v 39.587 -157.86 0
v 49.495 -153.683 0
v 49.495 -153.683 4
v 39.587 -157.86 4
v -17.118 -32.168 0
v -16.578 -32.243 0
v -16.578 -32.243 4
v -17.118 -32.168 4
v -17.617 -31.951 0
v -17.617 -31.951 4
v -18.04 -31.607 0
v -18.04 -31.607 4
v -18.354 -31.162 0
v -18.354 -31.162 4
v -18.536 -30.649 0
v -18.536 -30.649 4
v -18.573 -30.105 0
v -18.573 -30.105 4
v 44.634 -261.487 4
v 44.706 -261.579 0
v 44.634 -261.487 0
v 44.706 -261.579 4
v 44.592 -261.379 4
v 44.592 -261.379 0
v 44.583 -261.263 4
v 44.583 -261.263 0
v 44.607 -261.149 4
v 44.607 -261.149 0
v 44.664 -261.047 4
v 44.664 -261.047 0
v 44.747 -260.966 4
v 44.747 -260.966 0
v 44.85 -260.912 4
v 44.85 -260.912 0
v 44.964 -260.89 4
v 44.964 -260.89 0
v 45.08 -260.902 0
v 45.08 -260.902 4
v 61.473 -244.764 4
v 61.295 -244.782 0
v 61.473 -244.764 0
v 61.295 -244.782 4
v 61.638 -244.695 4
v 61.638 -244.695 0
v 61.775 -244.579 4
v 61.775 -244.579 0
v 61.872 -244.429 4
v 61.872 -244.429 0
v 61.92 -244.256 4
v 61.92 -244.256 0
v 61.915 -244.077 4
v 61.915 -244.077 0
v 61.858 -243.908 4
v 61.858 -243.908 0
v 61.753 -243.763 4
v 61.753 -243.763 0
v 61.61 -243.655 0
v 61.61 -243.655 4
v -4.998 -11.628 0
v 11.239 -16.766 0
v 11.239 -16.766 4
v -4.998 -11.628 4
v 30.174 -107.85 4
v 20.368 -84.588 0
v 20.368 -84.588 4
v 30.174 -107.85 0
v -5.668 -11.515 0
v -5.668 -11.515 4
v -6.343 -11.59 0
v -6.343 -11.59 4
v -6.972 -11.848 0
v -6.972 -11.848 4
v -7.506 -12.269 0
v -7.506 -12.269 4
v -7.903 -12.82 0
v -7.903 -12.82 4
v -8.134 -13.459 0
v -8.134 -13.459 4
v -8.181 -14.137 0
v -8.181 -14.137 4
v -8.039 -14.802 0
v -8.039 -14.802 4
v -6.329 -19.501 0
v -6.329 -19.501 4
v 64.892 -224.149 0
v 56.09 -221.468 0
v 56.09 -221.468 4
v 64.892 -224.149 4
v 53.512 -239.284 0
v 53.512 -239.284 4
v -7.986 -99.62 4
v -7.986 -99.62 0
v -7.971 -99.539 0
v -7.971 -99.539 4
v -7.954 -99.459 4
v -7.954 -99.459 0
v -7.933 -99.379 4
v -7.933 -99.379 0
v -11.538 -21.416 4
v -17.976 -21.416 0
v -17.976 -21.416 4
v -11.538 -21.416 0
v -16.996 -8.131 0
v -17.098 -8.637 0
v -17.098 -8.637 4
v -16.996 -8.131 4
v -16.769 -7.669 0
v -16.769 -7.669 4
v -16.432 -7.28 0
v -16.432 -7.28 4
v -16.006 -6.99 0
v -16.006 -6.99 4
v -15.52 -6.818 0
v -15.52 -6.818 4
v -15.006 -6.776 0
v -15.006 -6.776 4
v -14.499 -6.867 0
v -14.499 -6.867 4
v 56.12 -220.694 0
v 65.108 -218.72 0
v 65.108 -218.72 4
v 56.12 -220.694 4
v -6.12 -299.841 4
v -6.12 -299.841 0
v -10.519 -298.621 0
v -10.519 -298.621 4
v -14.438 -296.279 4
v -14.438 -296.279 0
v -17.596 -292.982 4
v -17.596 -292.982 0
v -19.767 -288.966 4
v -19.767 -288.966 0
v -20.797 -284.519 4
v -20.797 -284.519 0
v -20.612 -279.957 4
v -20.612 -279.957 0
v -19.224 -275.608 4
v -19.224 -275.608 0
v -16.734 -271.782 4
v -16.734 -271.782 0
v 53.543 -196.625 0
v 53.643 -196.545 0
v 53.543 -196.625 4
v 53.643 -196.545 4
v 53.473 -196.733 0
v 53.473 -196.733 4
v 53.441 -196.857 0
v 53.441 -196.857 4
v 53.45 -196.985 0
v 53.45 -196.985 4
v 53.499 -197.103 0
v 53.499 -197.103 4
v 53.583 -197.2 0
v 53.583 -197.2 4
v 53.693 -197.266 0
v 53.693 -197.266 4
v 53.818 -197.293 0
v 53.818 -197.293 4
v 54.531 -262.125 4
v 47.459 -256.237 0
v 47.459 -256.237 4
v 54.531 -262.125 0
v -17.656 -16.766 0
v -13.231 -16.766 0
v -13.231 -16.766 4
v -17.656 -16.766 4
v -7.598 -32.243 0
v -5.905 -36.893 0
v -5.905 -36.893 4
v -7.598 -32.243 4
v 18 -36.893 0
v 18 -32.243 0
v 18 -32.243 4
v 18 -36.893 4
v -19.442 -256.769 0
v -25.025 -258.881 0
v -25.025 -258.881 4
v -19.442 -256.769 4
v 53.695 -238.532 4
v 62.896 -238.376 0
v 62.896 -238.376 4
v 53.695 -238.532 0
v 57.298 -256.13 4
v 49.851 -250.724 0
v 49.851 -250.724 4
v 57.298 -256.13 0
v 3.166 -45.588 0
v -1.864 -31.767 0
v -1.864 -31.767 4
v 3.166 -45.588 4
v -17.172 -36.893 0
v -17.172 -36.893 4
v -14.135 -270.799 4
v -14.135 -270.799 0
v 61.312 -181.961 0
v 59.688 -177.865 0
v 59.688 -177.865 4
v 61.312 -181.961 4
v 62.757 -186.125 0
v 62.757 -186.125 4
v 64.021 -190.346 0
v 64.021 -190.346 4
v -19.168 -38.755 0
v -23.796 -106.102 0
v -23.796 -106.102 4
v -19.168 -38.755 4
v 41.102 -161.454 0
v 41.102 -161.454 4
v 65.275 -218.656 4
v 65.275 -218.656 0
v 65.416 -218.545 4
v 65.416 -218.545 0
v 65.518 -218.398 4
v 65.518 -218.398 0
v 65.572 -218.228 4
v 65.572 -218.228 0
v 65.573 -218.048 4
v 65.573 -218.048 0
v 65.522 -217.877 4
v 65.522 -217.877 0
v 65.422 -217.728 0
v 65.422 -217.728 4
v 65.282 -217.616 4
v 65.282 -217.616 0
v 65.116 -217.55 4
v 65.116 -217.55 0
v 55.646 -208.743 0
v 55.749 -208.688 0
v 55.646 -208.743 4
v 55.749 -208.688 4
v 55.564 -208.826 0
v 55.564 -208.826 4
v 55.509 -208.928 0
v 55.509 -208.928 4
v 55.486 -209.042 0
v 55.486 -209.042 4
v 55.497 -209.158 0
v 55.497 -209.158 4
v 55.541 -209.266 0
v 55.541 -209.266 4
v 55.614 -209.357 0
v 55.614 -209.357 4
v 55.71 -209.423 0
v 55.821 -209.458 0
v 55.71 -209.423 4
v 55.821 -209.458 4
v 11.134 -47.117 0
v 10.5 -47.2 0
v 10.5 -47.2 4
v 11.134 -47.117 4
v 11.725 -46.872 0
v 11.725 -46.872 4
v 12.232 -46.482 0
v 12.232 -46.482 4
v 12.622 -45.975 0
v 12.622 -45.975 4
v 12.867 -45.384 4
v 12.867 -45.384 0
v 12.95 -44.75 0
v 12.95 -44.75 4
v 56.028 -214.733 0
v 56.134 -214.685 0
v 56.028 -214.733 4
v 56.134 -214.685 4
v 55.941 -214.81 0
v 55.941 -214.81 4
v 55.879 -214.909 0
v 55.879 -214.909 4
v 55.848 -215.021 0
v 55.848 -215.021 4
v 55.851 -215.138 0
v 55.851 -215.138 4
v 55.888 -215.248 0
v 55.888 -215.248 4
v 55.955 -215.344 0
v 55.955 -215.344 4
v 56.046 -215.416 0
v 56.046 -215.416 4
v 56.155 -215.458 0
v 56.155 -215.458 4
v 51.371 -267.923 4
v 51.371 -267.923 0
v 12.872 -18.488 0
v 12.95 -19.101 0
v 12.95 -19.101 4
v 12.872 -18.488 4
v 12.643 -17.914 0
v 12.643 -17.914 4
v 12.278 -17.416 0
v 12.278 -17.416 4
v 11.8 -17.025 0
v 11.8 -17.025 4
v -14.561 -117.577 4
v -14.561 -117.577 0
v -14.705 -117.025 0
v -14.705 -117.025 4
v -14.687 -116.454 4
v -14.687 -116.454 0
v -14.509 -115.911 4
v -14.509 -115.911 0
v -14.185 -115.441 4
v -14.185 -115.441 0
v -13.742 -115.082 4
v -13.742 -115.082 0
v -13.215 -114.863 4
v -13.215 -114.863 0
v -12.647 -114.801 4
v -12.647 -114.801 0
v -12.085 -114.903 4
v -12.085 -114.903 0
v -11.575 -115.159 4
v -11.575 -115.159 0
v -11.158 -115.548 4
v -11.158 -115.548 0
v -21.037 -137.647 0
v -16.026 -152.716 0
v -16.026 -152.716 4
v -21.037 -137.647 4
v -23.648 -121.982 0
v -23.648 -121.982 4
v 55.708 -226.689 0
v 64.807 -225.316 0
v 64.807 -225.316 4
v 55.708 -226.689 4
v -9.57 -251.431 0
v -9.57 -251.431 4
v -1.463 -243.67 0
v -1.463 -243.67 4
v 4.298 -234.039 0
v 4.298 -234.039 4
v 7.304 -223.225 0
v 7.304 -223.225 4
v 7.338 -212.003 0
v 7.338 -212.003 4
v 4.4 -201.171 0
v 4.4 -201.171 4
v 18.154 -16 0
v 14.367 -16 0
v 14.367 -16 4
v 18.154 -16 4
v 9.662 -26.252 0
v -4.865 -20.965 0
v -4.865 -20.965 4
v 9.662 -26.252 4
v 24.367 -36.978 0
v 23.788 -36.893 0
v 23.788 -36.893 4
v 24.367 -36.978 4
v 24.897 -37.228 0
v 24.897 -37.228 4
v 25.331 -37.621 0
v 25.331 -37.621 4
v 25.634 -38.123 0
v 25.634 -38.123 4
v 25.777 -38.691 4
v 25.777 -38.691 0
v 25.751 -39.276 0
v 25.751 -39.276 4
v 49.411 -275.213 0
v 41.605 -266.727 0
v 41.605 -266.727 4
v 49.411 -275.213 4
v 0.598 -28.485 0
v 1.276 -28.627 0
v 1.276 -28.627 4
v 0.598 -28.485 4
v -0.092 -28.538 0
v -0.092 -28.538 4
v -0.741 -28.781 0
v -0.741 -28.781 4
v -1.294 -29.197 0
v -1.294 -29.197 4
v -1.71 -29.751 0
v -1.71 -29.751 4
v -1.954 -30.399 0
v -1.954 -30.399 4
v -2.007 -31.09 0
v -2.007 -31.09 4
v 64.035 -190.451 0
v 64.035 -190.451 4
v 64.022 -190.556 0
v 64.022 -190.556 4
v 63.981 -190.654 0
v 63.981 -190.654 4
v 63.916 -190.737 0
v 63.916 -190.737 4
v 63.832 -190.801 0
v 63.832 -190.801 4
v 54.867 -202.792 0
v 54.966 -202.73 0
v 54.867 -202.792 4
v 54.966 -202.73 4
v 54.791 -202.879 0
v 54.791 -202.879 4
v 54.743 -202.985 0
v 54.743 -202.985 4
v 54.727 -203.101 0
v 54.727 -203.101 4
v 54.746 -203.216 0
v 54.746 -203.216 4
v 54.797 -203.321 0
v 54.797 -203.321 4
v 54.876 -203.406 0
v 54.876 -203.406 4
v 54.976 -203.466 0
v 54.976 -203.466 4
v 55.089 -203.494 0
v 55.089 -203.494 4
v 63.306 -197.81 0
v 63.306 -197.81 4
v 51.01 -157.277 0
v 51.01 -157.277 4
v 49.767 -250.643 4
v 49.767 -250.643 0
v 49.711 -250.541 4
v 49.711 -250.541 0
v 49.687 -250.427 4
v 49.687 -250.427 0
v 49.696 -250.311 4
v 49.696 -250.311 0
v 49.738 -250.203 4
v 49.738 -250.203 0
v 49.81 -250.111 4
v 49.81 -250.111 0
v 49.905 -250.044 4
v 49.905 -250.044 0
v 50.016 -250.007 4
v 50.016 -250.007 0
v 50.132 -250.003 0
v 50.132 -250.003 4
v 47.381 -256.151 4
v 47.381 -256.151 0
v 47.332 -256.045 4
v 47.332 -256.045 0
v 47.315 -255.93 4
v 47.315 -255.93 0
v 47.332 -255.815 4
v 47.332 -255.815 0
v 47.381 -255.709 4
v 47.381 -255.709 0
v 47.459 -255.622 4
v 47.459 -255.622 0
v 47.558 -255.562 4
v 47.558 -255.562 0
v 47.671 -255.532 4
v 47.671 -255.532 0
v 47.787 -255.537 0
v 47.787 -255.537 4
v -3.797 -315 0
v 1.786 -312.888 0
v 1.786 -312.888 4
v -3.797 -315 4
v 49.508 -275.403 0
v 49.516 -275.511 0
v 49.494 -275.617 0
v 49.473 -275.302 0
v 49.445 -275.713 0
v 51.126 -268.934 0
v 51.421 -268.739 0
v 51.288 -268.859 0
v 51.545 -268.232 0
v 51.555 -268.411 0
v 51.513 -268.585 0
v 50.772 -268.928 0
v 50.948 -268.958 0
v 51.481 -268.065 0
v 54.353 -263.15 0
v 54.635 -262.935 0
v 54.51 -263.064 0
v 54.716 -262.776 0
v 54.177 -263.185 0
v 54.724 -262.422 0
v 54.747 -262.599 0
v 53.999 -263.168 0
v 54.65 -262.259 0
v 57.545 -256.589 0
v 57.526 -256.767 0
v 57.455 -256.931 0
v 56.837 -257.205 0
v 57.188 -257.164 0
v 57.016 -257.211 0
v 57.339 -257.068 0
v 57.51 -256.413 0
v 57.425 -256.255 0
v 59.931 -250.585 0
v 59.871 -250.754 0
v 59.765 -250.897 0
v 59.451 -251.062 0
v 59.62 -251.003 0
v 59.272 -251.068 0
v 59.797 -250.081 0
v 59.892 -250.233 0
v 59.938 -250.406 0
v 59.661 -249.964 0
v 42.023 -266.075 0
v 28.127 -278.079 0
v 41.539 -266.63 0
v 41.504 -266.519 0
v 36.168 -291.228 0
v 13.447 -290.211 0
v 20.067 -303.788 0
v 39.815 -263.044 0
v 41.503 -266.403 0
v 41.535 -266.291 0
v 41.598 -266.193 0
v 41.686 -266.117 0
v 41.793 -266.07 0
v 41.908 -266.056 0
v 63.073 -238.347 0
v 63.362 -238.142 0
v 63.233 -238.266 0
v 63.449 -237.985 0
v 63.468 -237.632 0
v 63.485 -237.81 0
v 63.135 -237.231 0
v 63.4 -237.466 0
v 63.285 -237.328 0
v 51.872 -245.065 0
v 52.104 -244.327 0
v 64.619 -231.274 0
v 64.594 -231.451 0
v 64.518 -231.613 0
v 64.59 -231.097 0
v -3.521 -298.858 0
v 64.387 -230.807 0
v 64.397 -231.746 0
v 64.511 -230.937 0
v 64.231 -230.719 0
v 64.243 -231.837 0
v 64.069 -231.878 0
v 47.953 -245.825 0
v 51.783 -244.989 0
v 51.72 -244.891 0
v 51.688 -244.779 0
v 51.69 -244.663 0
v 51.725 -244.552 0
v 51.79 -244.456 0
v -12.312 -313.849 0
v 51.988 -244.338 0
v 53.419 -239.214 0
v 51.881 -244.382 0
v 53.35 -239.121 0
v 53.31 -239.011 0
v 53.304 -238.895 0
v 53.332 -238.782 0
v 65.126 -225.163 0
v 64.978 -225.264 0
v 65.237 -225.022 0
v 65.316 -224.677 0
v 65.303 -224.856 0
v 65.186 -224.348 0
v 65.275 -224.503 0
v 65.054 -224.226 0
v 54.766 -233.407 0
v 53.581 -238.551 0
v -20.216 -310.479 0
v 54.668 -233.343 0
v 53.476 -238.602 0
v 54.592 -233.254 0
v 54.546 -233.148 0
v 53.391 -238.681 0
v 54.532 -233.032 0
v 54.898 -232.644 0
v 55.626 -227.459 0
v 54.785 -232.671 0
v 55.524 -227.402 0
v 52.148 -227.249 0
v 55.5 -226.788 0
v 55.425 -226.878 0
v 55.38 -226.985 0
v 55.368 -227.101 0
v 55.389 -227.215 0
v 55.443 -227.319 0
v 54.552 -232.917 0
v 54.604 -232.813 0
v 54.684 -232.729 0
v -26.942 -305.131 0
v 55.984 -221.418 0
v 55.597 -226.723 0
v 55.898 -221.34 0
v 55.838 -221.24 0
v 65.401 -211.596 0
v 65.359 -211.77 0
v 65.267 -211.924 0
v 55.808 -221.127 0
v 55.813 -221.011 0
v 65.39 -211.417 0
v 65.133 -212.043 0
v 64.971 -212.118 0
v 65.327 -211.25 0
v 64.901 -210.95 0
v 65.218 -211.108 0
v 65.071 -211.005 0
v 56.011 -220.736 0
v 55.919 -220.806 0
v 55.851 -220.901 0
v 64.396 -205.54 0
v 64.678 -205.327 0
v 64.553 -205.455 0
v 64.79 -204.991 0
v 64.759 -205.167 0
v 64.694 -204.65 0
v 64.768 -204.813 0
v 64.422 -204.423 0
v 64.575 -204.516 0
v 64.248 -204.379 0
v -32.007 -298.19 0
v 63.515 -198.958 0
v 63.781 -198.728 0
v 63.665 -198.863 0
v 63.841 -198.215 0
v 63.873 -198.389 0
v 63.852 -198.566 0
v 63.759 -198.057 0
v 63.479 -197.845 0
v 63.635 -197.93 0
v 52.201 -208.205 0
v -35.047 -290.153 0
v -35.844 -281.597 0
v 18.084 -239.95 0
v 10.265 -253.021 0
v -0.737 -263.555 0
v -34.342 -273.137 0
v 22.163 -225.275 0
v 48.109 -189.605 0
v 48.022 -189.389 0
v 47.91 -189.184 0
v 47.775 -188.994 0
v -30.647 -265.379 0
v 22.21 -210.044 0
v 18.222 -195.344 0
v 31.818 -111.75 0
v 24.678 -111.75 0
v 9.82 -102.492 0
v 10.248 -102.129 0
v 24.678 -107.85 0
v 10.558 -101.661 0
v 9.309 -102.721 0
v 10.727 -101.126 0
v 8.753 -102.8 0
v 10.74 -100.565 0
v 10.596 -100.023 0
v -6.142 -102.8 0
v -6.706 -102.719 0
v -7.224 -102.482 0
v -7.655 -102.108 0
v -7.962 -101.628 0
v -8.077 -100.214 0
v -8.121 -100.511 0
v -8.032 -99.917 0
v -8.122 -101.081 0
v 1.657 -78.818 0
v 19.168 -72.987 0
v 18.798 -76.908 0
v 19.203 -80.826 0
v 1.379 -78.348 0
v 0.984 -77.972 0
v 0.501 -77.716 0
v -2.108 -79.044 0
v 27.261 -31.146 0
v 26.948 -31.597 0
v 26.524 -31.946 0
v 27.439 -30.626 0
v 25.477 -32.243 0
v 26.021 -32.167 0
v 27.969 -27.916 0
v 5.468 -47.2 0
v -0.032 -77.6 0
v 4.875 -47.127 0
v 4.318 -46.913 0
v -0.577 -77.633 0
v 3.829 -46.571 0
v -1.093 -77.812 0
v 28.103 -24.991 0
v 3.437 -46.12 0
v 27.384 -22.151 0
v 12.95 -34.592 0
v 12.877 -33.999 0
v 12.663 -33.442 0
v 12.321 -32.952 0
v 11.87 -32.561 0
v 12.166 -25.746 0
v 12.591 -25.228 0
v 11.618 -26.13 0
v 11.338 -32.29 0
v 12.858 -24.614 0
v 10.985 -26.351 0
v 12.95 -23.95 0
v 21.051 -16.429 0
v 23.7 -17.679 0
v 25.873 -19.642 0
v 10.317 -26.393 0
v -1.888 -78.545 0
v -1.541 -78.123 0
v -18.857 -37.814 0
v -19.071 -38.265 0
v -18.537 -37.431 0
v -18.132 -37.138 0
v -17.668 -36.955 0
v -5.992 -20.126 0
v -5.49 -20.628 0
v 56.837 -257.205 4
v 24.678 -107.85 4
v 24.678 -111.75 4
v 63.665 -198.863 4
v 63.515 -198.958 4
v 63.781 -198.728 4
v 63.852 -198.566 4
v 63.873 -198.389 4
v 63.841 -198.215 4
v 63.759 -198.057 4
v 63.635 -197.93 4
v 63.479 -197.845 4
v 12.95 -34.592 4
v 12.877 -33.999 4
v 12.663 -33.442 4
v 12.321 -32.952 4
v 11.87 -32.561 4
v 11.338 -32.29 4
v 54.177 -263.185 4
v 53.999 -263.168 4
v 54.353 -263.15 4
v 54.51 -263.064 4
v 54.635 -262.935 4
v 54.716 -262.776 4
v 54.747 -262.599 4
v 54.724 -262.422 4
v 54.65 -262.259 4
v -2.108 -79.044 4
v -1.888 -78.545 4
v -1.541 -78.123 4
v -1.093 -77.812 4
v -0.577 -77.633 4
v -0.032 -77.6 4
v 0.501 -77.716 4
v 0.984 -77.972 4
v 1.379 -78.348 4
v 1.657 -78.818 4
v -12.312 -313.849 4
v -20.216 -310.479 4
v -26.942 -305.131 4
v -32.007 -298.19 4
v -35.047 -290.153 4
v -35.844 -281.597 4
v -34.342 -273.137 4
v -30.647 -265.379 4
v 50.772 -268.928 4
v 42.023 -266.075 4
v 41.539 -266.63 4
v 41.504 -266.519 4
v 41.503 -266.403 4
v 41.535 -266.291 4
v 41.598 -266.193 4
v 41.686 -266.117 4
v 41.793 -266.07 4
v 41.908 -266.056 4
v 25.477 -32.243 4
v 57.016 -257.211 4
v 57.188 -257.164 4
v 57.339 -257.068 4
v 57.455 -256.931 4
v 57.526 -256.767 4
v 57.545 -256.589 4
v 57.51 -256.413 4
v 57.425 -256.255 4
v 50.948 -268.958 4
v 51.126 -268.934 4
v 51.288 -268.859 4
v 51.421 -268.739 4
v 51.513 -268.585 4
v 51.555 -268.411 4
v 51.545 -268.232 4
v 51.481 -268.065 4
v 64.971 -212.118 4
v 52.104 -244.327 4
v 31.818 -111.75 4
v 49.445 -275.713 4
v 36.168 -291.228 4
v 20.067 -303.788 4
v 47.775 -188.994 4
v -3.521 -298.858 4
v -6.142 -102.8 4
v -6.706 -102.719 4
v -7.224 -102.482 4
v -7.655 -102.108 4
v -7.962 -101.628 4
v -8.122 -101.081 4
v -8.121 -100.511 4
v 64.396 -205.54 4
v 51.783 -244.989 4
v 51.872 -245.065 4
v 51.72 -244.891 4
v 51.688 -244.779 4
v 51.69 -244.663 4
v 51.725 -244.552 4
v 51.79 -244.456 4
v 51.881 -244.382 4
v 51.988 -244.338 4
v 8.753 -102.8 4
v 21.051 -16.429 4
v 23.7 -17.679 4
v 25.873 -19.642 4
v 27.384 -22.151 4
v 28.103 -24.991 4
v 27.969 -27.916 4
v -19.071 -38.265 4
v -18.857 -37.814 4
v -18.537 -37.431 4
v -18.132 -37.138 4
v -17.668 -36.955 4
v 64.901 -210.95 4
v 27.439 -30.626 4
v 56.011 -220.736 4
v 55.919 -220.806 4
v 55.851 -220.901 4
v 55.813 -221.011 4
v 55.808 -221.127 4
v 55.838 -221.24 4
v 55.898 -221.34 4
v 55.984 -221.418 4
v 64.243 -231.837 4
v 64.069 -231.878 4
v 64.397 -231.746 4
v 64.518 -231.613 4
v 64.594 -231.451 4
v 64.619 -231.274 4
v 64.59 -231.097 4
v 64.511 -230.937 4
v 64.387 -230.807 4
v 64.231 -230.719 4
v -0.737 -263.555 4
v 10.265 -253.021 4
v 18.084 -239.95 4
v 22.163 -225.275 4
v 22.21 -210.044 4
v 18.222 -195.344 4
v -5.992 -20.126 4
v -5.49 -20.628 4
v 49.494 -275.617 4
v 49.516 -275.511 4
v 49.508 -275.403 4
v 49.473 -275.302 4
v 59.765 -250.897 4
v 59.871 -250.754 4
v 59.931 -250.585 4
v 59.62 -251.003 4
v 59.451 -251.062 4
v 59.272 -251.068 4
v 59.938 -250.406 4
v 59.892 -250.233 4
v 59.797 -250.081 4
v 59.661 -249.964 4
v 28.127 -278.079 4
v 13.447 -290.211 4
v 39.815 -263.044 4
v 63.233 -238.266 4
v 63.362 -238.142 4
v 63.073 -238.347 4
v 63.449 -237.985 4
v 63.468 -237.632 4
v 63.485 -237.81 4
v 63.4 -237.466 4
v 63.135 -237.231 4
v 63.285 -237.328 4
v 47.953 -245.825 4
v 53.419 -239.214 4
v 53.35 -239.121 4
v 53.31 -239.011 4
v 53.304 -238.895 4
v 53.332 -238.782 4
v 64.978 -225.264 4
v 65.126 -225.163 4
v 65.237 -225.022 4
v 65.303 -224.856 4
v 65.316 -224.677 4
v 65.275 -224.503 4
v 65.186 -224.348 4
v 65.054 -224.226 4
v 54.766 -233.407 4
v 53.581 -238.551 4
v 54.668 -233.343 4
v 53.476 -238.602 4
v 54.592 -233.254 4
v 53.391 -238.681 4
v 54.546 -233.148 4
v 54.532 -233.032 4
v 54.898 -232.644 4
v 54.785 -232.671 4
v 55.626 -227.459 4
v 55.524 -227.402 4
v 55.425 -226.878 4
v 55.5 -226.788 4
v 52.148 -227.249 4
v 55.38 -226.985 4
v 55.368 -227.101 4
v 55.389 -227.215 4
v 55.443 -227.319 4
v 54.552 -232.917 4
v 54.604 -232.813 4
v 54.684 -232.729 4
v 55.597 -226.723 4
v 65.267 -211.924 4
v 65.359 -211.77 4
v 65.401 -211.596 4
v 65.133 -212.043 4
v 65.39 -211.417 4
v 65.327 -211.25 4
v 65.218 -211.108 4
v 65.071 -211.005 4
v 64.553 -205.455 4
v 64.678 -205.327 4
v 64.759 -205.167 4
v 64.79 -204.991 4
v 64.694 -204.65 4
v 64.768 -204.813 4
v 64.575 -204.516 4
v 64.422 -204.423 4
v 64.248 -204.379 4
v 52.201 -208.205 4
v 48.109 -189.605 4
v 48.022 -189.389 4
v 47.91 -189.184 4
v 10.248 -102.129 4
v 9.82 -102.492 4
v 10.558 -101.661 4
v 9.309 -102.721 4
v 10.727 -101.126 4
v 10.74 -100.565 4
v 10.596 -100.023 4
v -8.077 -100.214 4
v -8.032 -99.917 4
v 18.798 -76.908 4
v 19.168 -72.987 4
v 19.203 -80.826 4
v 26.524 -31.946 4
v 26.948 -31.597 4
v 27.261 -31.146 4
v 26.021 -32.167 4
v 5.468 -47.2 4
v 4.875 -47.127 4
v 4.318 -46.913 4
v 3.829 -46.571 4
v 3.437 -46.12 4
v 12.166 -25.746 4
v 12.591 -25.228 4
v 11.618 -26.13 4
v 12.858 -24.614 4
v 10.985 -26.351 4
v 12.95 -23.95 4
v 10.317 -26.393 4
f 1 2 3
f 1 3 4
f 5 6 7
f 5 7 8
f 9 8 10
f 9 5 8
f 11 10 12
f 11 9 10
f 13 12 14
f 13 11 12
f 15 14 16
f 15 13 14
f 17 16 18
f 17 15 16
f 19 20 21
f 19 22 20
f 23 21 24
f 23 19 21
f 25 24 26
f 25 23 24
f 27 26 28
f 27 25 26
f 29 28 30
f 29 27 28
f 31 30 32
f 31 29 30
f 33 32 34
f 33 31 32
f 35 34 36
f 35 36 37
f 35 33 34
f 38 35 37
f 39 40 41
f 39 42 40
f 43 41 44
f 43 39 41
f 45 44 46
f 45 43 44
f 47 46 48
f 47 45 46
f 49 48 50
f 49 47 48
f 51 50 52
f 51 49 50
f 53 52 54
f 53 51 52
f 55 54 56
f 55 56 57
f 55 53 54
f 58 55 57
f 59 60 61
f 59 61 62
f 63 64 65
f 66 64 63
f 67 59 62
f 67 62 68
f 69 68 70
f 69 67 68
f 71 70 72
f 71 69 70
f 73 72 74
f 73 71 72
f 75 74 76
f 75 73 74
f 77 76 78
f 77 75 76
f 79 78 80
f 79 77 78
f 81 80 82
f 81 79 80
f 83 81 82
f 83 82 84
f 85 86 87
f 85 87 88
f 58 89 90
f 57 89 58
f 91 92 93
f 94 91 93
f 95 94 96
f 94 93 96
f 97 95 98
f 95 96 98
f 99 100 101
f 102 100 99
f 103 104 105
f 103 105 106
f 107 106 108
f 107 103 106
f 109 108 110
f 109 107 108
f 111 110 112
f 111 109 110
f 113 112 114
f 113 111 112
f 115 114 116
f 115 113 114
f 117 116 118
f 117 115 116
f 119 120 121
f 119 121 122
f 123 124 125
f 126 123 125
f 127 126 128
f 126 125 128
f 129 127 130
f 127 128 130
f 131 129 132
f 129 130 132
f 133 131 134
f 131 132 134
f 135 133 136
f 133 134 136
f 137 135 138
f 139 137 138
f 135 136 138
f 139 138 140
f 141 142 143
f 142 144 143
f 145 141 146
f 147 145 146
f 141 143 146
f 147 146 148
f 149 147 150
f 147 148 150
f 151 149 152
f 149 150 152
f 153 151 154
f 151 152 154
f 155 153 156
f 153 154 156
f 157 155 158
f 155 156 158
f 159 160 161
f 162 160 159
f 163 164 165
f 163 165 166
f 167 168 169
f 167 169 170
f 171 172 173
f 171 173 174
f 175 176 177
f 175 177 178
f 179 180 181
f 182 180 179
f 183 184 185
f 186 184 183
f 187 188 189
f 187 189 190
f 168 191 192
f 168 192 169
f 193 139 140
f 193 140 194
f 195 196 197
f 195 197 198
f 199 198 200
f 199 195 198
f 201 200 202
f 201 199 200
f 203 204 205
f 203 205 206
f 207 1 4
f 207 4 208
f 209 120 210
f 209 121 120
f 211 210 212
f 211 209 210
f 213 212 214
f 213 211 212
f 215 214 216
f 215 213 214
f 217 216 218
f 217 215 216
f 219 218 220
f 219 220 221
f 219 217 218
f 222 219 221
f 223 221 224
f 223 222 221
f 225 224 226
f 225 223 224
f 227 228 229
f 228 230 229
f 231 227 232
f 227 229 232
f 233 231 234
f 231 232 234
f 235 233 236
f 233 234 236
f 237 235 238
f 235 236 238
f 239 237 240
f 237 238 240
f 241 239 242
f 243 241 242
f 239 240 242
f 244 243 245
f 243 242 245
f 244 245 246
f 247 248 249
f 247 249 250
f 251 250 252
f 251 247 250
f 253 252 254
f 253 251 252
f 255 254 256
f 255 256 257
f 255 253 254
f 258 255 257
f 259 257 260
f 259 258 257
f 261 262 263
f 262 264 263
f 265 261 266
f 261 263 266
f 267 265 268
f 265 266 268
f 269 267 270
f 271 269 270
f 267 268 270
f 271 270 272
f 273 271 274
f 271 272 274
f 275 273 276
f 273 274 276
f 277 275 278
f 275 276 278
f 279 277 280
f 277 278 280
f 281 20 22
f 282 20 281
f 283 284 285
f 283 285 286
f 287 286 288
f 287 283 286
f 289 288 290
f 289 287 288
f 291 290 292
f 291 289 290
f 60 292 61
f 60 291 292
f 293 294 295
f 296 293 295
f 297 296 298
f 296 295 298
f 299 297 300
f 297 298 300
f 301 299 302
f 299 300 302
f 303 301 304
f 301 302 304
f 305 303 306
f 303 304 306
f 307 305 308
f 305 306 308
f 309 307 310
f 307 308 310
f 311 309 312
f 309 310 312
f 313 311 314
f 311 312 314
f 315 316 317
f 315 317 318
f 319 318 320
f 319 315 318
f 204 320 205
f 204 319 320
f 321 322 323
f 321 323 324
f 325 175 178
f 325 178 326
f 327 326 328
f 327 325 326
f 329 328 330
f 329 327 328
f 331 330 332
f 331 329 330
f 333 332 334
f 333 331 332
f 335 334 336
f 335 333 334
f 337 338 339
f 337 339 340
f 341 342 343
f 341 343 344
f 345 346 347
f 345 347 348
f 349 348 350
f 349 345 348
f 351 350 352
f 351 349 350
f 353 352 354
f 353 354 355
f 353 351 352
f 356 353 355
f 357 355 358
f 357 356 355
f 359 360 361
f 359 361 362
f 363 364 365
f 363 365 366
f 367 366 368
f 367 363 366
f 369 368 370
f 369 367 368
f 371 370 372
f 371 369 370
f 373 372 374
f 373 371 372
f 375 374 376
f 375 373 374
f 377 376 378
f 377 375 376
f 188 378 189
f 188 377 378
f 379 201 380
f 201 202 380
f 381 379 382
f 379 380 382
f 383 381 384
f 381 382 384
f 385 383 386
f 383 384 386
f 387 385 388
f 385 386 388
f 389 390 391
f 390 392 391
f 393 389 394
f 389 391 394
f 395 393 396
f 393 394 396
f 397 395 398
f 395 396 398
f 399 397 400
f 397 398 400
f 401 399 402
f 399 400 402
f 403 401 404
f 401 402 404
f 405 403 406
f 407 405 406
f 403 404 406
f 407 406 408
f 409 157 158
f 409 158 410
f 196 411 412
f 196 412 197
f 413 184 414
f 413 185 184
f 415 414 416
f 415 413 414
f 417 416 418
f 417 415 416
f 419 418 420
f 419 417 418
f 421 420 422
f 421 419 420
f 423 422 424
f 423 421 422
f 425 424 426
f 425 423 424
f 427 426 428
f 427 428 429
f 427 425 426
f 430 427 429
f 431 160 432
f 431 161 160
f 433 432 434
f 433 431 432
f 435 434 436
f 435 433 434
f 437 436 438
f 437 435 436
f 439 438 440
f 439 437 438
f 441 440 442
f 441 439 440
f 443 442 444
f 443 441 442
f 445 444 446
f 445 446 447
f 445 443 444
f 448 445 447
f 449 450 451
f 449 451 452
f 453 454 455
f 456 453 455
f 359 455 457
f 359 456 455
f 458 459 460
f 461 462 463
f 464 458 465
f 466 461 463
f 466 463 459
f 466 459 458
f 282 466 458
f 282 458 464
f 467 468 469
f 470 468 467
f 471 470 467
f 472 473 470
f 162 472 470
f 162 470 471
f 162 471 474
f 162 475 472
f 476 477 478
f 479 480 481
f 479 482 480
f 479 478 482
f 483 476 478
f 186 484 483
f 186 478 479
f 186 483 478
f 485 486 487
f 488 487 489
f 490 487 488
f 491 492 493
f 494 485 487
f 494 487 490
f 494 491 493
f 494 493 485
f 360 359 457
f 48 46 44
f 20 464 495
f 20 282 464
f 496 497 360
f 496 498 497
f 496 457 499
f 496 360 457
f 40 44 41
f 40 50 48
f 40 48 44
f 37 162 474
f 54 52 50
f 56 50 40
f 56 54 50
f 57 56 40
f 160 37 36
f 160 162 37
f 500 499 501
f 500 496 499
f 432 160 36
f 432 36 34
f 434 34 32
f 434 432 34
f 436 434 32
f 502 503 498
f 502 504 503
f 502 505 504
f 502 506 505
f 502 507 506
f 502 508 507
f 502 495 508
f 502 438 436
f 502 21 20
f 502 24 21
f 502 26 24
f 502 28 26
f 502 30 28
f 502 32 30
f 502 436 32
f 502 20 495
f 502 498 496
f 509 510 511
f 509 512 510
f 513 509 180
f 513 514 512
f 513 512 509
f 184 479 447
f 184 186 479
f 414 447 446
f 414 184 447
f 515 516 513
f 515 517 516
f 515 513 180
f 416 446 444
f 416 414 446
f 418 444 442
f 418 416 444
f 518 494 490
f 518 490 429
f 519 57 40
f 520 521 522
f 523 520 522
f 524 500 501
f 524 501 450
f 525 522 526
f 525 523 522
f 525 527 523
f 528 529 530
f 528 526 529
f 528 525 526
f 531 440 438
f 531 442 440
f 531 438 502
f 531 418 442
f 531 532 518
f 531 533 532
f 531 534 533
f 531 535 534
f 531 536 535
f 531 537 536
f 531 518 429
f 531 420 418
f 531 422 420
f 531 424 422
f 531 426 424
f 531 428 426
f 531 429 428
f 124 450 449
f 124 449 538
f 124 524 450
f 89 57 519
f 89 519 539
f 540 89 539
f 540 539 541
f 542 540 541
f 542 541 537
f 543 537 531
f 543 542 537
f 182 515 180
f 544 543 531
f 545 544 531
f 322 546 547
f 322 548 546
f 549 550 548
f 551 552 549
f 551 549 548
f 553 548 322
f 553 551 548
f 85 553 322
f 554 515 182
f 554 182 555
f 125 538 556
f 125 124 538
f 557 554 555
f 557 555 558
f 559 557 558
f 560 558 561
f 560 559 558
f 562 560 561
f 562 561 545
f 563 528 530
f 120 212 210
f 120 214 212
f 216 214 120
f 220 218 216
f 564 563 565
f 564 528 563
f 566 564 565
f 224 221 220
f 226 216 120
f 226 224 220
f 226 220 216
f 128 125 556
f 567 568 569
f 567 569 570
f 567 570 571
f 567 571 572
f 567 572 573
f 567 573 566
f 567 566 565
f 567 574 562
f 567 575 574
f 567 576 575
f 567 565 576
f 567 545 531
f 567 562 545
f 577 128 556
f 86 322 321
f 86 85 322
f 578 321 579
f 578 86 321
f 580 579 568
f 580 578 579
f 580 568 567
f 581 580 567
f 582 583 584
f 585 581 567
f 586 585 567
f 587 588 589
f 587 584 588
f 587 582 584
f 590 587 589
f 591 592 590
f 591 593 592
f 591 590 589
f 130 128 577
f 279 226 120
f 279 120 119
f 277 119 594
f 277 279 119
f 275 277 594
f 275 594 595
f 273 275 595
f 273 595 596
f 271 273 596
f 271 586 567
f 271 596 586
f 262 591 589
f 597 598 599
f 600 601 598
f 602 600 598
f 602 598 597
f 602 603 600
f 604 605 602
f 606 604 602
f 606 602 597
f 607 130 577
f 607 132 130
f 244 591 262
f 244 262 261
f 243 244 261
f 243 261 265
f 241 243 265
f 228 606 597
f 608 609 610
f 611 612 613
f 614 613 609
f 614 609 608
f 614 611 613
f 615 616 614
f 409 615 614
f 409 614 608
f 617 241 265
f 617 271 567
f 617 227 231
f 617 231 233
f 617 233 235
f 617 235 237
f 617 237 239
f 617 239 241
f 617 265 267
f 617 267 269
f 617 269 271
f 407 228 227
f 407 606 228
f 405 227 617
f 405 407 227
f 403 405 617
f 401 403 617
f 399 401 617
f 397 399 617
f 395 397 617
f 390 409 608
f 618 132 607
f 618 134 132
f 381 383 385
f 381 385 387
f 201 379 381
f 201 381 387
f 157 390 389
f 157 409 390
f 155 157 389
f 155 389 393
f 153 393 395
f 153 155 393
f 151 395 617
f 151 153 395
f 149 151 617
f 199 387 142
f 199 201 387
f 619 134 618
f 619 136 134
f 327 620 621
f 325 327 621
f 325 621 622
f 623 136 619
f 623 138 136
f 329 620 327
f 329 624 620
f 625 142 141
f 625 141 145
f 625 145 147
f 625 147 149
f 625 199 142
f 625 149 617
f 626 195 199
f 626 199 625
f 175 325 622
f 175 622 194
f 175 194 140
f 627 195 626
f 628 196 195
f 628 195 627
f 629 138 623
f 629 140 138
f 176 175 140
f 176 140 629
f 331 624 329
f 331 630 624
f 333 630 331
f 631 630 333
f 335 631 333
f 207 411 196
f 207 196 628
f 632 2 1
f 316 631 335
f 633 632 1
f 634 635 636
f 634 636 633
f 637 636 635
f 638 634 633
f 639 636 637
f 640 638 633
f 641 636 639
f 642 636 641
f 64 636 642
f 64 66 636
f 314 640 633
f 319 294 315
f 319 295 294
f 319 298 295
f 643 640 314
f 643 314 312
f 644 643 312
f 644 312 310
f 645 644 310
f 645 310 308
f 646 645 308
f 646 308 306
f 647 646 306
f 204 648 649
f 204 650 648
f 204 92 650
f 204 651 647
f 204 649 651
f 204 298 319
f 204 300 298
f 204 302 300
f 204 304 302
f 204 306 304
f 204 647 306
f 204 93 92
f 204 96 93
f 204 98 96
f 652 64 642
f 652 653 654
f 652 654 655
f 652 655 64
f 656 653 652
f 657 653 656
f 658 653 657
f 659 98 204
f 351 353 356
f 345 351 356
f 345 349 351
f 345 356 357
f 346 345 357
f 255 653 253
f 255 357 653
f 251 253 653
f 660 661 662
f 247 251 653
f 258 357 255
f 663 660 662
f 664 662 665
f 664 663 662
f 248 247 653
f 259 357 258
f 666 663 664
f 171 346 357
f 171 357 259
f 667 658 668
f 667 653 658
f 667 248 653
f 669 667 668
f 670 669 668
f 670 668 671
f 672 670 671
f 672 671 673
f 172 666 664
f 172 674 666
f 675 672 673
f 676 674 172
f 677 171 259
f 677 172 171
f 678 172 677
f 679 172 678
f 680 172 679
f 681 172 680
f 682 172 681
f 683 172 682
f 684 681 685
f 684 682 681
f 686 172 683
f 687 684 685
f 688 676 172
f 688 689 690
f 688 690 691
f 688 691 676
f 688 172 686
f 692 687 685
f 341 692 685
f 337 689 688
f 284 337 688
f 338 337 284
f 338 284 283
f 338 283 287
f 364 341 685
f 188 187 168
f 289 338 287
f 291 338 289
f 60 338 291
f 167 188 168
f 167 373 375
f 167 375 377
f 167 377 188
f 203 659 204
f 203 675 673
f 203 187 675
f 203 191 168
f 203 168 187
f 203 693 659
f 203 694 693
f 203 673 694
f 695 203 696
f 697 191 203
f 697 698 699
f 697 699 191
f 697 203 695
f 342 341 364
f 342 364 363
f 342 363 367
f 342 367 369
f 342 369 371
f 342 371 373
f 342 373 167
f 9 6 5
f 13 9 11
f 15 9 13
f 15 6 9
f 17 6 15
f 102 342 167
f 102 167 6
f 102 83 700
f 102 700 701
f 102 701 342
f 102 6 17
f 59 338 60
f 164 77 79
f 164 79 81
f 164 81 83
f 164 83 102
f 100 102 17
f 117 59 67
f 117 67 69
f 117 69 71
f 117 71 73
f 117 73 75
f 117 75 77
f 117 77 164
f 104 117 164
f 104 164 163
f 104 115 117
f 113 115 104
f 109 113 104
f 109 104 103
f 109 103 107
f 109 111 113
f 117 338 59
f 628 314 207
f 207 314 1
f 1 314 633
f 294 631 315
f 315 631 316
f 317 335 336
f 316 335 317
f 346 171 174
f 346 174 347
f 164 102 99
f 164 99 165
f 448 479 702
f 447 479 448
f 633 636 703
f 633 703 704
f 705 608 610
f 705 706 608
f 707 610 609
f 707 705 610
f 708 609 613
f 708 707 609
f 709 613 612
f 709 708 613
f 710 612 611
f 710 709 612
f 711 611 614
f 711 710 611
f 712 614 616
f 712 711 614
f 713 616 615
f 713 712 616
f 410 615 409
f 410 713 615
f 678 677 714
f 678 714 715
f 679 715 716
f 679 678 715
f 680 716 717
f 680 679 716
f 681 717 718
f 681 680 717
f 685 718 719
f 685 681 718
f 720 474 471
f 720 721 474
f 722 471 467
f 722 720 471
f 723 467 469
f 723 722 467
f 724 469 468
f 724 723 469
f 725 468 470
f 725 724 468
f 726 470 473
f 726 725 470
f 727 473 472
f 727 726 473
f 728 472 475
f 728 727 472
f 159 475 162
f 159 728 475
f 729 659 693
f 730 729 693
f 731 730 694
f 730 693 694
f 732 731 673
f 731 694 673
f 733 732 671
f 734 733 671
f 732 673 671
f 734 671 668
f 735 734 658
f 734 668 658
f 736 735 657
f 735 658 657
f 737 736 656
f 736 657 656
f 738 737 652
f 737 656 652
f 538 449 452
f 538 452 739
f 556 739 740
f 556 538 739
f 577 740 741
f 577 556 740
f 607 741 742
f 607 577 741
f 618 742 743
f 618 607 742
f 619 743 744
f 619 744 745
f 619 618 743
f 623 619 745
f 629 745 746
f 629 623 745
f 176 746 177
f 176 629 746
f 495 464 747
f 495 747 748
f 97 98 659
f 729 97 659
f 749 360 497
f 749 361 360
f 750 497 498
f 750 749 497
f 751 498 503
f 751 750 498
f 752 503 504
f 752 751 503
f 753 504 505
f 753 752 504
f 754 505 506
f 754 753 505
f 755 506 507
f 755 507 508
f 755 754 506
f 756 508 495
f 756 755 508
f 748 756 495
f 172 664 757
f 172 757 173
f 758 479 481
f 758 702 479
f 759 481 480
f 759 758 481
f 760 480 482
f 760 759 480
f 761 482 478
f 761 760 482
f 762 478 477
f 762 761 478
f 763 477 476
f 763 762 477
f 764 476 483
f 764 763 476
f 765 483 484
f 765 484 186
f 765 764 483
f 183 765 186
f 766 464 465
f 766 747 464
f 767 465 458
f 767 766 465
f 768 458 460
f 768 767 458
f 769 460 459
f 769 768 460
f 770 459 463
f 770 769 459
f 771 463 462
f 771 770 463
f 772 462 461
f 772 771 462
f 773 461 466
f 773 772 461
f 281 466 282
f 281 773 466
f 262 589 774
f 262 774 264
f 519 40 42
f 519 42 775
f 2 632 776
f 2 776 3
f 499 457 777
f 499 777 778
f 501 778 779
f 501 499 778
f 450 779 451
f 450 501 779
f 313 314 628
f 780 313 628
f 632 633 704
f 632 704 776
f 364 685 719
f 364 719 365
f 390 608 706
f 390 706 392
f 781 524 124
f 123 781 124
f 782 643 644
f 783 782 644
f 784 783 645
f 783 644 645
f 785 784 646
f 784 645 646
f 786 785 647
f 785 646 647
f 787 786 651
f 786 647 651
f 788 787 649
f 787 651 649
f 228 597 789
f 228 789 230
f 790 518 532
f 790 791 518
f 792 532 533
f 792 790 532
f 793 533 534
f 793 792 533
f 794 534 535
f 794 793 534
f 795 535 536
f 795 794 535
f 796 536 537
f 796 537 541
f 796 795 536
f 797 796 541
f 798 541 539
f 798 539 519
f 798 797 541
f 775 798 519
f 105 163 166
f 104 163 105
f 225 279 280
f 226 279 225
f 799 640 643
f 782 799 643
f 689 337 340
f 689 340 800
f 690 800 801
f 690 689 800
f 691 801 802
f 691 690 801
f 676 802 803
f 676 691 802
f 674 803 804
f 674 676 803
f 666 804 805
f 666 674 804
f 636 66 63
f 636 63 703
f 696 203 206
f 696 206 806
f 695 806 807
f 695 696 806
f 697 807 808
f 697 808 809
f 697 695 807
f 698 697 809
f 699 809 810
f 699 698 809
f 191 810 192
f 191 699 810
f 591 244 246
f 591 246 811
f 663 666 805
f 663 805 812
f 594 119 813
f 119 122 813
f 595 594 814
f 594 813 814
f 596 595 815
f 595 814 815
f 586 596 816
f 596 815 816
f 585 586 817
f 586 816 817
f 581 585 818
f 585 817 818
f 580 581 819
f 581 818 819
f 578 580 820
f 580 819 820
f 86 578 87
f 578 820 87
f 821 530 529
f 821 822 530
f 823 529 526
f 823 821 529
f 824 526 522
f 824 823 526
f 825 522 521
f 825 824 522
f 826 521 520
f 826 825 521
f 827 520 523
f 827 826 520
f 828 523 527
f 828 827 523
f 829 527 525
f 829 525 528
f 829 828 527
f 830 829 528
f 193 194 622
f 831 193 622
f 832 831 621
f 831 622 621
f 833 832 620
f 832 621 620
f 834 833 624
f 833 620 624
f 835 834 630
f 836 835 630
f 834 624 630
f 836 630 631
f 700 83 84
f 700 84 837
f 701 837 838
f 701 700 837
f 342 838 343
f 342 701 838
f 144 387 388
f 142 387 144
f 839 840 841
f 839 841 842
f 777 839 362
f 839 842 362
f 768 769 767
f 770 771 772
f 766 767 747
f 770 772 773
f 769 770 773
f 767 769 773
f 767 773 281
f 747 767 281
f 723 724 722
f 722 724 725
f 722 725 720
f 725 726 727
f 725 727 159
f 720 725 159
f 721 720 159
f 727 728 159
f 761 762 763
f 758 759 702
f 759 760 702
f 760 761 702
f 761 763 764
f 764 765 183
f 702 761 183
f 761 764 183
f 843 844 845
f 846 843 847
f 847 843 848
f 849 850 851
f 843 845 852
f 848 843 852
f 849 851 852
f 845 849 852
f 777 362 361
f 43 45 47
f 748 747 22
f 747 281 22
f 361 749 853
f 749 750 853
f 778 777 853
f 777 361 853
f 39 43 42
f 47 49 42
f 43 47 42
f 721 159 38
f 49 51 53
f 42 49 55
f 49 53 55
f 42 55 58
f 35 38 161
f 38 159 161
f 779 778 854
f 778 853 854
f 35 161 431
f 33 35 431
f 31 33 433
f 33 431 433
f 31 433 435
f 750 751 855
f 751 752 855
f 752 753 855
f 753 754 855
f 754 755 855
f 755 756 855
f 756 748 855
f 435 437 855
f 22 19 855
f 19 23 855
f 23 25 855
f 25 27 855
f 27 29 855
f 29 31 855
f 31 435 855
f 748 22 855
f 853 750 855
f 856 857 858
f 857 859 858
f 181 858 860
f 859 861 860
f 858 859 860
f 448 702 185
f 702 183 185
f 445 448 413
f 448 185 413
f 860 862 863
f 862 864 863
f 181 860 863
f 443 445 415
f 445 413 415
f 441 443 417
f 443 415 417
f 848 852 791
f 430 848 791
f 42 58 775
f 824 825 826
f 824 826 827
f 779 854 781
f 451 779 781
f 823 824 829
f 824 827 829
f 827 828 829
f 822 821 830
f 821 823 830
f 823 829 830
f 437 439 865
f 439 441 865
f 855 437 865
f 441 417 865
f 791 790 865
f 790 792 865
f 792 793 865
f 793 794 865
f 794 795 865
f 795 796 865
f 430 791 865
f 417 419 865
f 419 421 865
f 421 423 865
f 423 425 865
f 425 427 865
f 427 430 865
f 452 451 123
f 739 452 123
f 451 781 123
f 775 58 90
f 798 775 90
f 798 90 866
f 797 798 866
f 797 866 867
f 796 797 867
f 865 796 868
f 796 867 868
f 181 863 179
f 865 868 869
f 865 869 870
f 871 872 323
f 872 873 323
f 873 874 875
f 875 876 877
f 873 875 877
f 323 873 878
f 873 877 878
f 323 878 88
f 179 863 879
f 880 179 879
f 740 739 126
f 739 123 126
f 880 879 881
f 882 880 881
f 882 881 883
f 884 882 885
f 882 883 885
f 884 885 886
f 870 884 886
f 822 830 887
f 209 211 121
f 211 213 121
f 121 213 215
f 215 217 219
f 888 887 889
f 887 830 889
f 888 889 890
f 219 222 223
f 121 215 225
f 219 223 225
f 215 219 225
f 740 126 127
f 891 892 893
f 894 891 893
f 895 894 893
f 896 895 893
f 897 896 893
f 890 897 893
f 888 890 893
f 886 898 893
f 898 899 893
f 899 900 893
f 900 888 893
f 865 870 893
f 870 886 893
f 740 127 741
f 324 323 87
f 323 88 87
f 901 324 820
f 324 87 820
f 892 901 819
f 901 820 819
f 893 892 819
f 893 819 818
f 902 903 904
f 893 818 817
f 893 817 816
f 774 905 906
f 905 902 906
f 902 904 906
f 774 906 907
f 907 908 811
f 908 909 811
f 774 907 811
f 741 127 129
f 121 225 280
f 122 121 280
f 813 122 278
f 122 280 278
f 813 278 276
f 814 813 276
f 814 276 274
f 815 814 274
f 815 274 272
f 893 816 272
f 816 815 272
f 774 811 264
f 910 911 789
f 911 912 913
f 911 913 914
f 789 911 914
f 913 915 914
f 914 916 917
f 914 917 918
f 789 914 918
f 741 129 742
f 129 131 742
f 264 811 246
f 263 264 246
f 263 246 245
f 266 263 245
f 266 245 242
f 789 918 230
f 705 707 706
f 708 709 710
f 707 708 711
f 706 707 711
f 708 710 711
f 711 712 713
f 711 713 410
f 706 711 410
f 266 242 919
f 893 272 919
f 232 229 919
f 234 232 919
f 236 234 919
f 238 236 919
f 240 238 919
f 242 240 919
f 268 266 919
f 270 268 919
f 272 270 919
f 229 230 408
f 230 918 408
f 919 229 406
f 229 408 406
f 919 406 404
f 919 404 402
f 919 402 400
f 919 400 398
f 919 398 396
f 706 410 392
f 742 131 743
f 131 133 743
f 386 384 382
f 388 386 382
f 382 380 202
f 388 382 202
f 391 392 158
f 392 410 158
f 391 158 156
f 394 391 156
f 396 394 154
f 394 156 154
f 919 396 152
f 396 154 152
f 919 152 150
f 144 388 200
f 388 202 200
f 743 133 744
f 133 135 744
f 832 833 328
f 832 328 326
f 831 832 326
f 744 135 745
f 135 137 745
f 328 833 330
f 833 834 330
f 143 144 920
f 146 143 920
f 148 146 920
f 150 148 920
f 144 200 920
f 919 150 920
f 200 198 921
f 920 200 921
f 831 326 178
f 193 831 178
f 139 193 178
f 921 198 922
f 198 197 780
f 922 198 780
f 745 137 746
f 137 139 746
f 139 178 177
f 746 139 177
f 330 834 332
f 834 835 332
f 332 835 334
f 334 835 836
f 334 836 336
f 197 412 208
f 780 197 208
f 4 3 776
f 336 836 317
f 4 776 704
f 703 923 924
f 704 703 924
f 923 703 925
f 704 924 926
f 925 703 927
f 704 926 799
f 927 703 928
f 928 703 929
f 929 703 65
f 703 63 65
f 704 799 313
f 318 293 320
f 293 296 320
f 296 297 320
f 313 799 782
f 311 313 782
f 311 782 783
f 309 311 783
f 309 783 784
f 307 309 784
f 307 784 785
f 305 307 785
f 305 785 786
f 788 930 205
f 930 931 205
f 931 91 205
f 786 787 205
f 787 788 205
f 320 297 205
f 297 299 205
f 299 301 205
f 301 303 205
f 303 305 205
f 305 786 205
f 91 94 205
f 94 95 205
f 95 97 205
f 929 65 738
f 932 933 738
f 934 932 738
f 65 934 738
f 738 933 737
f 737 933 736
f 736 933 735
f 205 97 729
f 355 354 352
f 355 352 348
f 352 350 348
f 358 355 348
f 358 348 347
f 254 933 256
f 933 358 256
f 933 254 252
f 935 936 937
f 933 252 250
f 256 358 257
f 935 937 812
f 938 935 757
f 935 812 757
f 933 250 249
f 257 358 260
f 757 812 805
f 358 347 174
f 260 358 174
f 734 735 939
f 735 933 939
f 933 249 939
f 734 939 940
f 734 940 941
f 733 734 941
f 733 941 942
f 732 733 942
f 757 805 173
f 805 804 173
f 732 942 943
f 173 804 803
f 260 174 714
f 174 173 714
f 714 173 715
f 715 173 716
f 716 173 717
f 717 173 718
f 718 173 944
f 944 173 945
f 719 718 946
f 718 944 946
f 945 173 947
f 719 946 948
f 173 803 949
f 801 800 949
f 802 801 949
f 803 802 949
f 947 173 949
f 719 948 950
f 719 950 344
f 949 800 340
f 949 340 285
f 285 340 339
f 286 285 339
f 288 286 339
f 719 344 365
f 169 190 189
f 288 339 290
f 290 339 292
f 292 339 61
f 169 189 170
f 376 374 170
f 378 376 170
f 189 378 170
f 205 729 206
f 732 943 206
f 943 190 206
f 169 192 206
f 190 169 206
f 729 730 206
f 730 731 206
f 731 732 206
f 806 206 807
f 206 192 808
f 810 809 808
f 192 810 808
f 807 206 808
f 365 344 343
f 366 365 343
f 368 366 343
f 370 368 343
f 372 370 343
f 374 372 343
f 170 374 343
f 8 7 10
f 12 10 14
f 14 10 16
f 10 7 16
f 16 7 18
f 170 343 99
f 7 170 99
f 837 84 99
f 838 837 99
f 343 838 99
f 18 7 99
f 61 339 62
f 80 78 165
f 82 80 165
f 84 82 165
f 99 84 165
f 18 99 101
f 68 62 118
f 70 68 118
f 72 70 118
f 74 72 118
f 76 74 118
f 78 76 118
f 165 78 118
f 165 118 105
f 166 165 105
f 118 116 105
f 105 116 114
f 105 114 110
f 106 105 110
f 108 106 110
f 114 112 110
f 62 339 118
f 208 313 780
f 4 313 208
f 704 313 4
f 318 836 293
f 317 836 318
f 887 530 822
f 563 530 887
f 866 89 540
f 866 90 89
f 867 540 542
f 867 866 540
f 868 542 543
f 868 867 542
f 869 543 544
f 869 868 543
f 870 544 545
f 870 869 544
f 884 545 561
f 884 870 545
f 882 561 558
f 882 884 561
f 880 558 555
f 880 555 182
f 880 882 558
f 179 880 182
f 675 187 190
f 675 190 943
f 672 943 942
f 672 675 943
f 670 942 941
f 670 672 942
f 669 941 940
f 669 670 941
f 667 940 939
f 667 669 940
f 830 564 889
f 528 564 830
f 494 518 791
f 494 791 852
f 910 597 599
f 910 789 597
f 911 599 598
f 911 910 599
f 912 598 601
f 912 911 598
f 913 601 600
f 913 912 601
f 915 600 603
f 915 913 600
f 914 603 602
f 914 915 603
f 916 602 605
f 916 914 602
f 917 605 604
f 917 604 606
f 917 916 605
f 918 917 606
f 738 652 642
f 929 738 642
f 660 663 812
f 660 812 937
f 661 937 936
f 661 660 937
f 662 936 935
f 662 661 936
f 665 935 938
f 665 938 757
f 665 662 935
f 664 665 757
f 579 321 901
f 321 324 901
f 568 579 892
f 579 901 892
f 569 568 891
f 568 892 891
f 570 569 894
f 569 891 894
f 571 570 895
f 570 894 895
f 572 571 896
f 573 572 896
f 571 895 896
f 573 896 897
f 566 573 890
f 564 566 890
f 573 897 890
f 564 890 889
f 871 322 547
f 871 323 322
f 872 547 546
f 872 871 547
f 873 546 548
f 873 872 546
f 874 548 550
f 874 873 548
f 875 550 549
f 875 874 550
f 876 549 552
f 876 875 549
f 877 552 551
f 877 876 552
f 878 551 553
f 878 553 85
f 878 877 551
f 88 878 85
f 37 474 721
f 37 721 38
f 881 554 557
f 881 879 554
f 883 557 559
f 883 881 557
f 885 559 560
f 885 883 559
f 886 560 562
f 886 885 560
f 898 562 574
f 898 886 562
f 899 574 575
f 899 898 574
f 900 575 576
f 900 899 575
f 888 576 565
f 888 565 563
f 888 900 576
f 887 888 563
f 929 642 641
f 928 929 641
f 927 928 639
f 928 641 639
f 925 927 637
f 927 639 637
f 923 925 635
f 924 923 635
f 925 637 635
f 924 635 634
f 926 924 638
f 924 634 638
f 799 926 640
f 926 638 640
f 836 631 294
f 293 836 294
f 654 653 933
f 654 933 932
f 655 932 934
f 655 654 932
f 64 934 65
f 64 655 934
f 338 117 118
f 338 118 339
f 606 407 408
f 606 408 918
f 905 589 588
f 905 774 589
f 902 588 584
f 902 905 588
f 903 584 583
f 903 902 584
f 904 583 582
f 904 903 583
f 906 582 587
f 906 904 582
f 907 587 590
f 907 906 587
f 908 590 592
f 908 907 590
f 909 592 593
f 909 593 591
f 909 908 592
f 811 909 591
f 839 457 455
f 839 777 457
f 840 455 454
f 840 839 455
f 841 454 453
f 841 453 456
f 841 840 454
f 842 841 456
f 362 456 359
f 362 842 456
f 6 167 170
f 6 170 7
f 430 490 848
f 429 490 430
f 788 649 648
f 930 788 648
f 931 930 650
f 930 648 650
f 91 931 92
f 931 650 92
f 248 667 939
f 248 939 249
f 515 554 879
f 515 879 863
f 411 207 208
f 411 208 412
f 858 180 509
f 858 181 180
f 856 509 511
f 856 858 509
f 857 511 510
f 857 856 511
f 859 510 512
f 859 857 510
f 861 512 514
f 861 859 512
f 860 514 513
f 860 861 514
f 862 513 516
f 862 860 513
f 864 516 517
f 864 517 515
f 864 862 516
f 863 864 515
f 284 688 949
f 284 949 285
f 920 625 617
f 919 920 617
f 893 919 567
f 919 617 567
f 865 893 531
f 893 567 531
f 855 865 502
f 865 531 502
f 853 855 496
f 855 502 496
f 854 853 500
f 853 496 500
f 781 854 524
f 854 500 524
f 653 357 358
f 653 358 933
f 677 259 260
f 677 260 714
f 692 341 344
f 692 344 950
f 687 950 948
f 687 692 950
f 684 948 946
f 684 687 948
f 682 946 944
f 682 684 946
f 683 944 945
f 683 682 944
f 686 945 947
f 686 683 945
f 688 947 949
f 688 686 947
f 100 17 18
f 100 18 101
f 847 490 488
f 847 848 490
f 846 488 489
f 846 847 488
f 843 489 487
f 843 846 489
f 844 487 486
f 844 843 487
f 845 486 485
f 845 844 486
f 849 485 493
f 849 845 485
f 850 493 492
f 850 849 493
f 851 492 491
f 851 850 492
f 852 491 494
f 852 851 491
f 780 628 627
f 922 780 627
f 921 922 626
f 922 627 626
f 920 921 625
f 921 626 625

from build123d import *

# Parameters (mm, degrees)
BOSS_EXTRUDE1_DEPTH = 4
FILLET1_R           = 0.4
FILLET2_R           = 0.6


with BuildPart() as part:
    # Sketch1 → Boss-Extrude1 (new body)
    with BuildSketch(Plane.XY):
        with BuildLine():
            Line((-14.499129977, -6.867012113), (14.367174161, -16))
            Line((14.367174161, -16), (18.15387109, -16))
            ThreePointArc((18.15387109, -16), (25.872793622, -19.642466284), (27.968533139, -27.91635301))
            Line((27.968533139, -27.91635301), (27.439499229, -30.625816775))
            ThreePointArc((27.439499229, -30.625816775), (26.748073563, -31.786330679), (25.476566819, -32.242546173))
            Line((25.476566819, -32.242546173), (18, -32.242546173))
            Line((18, -32.242546173), (18, -36.892546173))
            Line((18, -36.892546173), (23.78761885, -36.892546173))
            ThreePointArc((23.78761885, -36.892546173), (25.331403357, -37.62103943), (25.75055126, -39.275816775))
            Line((25.75055126, -39.275816775), (19.168328866, -72.986875227))
            ThreePointArc((19.168328866, -72.986875227), (18.903762814, -78.877039551), (20.368176295, -84.588390014))
            Line((20.368176295, -84.588390014), (30.173934909, -107.85))
            Line((30.173934909, -107.85), (24.678215229, -107.85))
            Line((24.678215229, -107.85), (24.678215229, -111.75))
            Line((24.678215229, -111.75), (31.817950891, -111.75))
            Line((31.817950891, -111.75), (49.494630027, -153.683320214))
            Line((49.494630027, -153.683320214), (39.586931175, -157.859836948))
            Line((39.586931175, -157.859836948), (41.101848885, -161.453584898))
            Line((41.101848885, -161.453584898), (51.009547737, -157.277068164))
            Line((51.009547737, -157.277068164), (59.688079015, -177.864624701))
            ThreePointArc((59.688079015, -177.864624701), (62.10799078, -184.18292059), (64.103704557, -190.647745599))
            Line((64.103704557, -190.647745599), (52.448848585, -197.218781175))
            Line((52.448848585, -197.218781175), (65.808694789, -197.945888914))
            Line((65.808694789, -197.945888914), (53.567462973, -203.346483316))
            Line((53.567462973, -203.346483316), (66.884945667, -204.634439433))
            Line((66.884945667, -204.634439433), (54.312217418, -209.210538279))
            Line((54.312217418, -209.210538279), (67.514830834, -211.379679878))
            Line((67.514830834, -211.379679878), (54.666068058, -215.111096686))
            Line((54.666068058, -215.111096686), (67.695571684, -218.151855063))
            Line((67.695571684, -218.151855063), (54.627453954, -221.022129484))
            Line((54.627453954, -221.022129484), (67.42637092, -224.921090983))
            Line((67.42637092, -224.921090983), (54.196545445, -226.917561415))
            Line((54.196545445, -226.917561415), (66.708416062, -231.657526599))
            Line((66.708416062, -231.657526599), (53.375243393, -232.771386039))
            Line((53.375243393, -232.771386039), (65.544874215, -238.331445565))
            Line((65.544874215, -238.331445565), (52.167170795, -238.557780459))
            Line((52.167170795, -238.557780459), (63.940878095, -244.913407312))
            Line((63.940878095, -244.913407312), (50.577656806, -244.251219233))
            Line((50.577656806, -244.251219233), (61.903503389, -251.374376921))
            Line((61.903503389, -251.374376921), (48.613713227, -249.826586971))
            Line((48.613713227, -249.826586971), (59.44173754, -257.685853206))
            Line((59.44173754, -257.685853206), (46.284003576, -255.259289128))
            Line((46.284003576, -255.259289128), (56.566440102, -263.819994437))
            Line((56.566440102, -263.819994437), (43.59880487, -260.525360501))
            Line((43.59880487, -260.525360501), (53.290294836, -269.749741158))
            Line((53.290294836, -269.749741158), (40.569962289, -265.601570939))
            Line((40.569962289, -265.601570939), (49.627753757, -275.448935561))
            ThreePointArc((49.627753757, -275.448935561), (28.558785484, -297.812941794), (1.785859605, -312.888108085))
            Line((1.785859605, -312.888108085), (-3.79713943, -315))
            ThreePointArc((-3.79713943, -315), (-33.79713943, -294.273546964), (-25.025440375, -258.880847842))
            Line((-25.025440375, -258.880847842), (-19.44244134, -256.768955927))
            ThreePointArc((-19.44244134, -256.768955927), (4.29821428, -234.038615683), (4.399649005, -201.171051004))
            Line((4.399649005, -201.171051004), (-16.026093015, -152.716294646))
            ThreePointArc((-16.026093015, -152.716294646), (-22.647715731, -129.865425568), (-23.795753165, -106.102216294))
            Line((-23.795753165, -106.102216294), (-19.167544676, -38.755425513))
            ThreePointArc((-19.167544676, -38.755425513), (-18.537124111, -37.430656759), (-17.172250732, -36.892546173))
            Line((-17.172250732, -36.892546173), (-5.905128728, -36.892546173))
            Line((-5.905128728, -36.892546173), (-7.597590317, -32.242546173))
            Line((-7.597590317, -32.242546173), (-16.577805132, -32.242546173))
            ThreePointArc((-16.577805132, -32.242546173), (-18.039694546, -31.607419552), (-18.573099077, -30.105425513))
            Line((-18.573099077, -30.105425513), (-17.975910939, -21.415517819))
            Line((-17.975910939, -21.415517819), (-11.538306364, -21.415517819))
            Line((-11.538306364, -21.415517819), (-13.230767953, -16.765517819))
            Line((-13.230767953, -16.765517819), (-17.656353478, -16.765517819))
            Line((-17.656353478, -16.765517819), (-17.097726509, -8.636728098))
            ThreePointArc((-17.097726509, -8.636728098), (-16.228213916, -7.12078604), (-14.499129977, -6.867012113))
        make_face()
        with BuildLine():
            Line((-8.039189398, -14.802148248), (-6.329088682, -19.500611352))
            ThreePointArc((-6.329088682, -19.500611352), (-5.759253375, -20.395073615), (-4.864791112, -20.964908922))
            Line((-4.864791112, -20.964908922), (9.662050649, -26.252246921))
            ThreePointArc((9.662050649, -26.252246921), (11.905262269, -25.956922509), (12.95, -23.95))
            Line((12.95, -23.95), (12.95, -19.101392708))
            ThreePointArc((12.95, -19.101392708), (12.476507259, -17.653663778), (11.23904567, -16.765517819))
            Line((11.23904567, -16.765517819), (-4.997896808, -11.628324008))
            ThreePointArc((-4.997896808, -11.628324008), (-7.505894036, -12.269114715), (-8.039189398, -14.802148248))
        make_face(mode=Mode.SUBTRACT)
        with BuildLine():
            Line((-1.8643328, -31.767427321), (3.165925841, -45.587949351))
            ThreePointArc((3.165925841, -45.587949351), (4.062910493, -46.756922509), (5.468172762, -47.2))
            Line((5.468172762, -47.2), (10.5, -47.2))
            ThreePointArc((10.5, -47.2), (12.232411614, -46.482411614), (12.95, -44.75))
            Line((12.95, -44.75), (12.95, -34.591777725))
            ThreePointArc((12.95, -34.591777725), (12.506922509, -33.186515456), (11.337949351, -32.289530804))
            Line((11.337949351, -32.289530804), (1.275863472, -28.627231049))
            ThreePointArc((1.275863472, -28.627231049), (-1.294497493, -29.197066356), (-1.8643328, -31.767427321))
        make_face(mode=Mode.SUBTRACT)
        with BuildLine():
            Line((1.657284816, -78.8176291), (10.596301358, -100.023119123))
            ThreePointArc((10.596301358, -100.023119123), (10.419751266, -101.905947161), (8.753353691, -102.8))
            Line((8.753353691, -102.8), (-6.141789596, -102.8))
            ThreePointArc((-6.141789596, -102.8), (-7.654833819, -102.107936229), (-8.120754951, -100.510697178))
            ThreePointArc((-8.120754951, -100.510697178), (-8.05444857, -100.065191098), (-7.985836627, -99.620034266))
            ThreePointArc((-7.985836627, -99.620034266), (-7.962968981, -99.498759801), (-7.932665095, -99.379126613))
            Line((-7.932665095, -99.379126613), (-2.108355103, -79.043824493))
            ThreePointArc((-2.108355103, -79.043824493), (-0.305583194, -77.598108436), (1.657284816, -78.8176291))
        make_face(mode=Mode.SUBTRACT)
        with BuildLine():
            Line((-3.521215631, -298.858320046), (-6.119790114, -299.841287875))
            ThreePointArc((-6.119790114, -299.841287875), (-19.76735139, -288.966471728), (-16.733940587, -271.781711796))
            Line((-16.733940587, -271.781711796), (-14.135366104, -270.798743967))
            ThreePointArc((-14.135366104, -270.798743967), (18.084095095, -239.950425064), (18.221756508, -195.344444428))
            Line((18.221756508, -195.344444428), (-14.560581286, -117.576880877))
            ThreePointArc((-14.560581286, -117.576880877), (-13.741730826, -115.082087048), (-11.157717662, -115.548336225))
            Line((-11.157717662, -115.548336225), (47.774811887, -188.994412647))
            ThreePointArc((47.774811887, -188.994412647), (47.968900833, -189.285104624), (48.109417057, -189.605147645))
            ThreePointArc((48.109417057, -189.605147645), (44.356574969, -254.657971176), (-3.521215631, -298.858320046))
        make_face(mode=Mode.SUBTRACT)
    extrude(amount=BOSS_EXTRUDE1_DEPTH)

    # Fillet1
    fillet1_edges = [part.edges().sort_by_distance(p)[0] for p in [
        (64.103704557, -190.647745599, 2),
        (49.627753757, -275.448935561, 2),
        (40.569962289, -265.601570939, 2),
        (43.59880487, -260.525360501, 2),
        (46.284003576, -255.259289128, 2),
        (48.613713227, -249.826586971, 2),
        (50.577656806, -244.251219233, 2),
        (52.167170795, -238.557780459, 2),
        (53.375243393, -232.771386039, 2),
        (54.196545445, -226.917561415, 2),
        (54.627453954, -221.022129484, 2),
        (54.666068058, -215.111096686, 2),
        (54.312217418, -209.210538279, 2),
        (53.567462973, -203.346483316, 2),
        (52.448848585, -197.218781175, 2),
    ]]
    fillet(fillet1_edges, radius=FILLET1_R)

    # Fillet2
    fillet2_edges = [part.edges().sort_by_distance(p)[0] for p in [
        (53.290294836, -269.749741158, 2),
        (56.566440102, -263.819994437, 2),
        (59.44173754, -257.685853206, 2),
        (61.903503389, -251.374376921, 2),
        (63.940878095, -244.913407312, 2),
        (65.544874215, -238.331445565, 2),
        (66.708416062, -231.657526599, 2),
        (67.42637092, -224.921090983, 2),
        (67.695571684, -218.151855063, 2),
        (67.514830834, -211.379679878, 2),
        (66.884945667, -204.634439433, 2),
        (65.808694789, -197.945888914, 2),
    ]]
    fillet(fillet2_edges, radius=FILLET2_R)


solid = part.part
